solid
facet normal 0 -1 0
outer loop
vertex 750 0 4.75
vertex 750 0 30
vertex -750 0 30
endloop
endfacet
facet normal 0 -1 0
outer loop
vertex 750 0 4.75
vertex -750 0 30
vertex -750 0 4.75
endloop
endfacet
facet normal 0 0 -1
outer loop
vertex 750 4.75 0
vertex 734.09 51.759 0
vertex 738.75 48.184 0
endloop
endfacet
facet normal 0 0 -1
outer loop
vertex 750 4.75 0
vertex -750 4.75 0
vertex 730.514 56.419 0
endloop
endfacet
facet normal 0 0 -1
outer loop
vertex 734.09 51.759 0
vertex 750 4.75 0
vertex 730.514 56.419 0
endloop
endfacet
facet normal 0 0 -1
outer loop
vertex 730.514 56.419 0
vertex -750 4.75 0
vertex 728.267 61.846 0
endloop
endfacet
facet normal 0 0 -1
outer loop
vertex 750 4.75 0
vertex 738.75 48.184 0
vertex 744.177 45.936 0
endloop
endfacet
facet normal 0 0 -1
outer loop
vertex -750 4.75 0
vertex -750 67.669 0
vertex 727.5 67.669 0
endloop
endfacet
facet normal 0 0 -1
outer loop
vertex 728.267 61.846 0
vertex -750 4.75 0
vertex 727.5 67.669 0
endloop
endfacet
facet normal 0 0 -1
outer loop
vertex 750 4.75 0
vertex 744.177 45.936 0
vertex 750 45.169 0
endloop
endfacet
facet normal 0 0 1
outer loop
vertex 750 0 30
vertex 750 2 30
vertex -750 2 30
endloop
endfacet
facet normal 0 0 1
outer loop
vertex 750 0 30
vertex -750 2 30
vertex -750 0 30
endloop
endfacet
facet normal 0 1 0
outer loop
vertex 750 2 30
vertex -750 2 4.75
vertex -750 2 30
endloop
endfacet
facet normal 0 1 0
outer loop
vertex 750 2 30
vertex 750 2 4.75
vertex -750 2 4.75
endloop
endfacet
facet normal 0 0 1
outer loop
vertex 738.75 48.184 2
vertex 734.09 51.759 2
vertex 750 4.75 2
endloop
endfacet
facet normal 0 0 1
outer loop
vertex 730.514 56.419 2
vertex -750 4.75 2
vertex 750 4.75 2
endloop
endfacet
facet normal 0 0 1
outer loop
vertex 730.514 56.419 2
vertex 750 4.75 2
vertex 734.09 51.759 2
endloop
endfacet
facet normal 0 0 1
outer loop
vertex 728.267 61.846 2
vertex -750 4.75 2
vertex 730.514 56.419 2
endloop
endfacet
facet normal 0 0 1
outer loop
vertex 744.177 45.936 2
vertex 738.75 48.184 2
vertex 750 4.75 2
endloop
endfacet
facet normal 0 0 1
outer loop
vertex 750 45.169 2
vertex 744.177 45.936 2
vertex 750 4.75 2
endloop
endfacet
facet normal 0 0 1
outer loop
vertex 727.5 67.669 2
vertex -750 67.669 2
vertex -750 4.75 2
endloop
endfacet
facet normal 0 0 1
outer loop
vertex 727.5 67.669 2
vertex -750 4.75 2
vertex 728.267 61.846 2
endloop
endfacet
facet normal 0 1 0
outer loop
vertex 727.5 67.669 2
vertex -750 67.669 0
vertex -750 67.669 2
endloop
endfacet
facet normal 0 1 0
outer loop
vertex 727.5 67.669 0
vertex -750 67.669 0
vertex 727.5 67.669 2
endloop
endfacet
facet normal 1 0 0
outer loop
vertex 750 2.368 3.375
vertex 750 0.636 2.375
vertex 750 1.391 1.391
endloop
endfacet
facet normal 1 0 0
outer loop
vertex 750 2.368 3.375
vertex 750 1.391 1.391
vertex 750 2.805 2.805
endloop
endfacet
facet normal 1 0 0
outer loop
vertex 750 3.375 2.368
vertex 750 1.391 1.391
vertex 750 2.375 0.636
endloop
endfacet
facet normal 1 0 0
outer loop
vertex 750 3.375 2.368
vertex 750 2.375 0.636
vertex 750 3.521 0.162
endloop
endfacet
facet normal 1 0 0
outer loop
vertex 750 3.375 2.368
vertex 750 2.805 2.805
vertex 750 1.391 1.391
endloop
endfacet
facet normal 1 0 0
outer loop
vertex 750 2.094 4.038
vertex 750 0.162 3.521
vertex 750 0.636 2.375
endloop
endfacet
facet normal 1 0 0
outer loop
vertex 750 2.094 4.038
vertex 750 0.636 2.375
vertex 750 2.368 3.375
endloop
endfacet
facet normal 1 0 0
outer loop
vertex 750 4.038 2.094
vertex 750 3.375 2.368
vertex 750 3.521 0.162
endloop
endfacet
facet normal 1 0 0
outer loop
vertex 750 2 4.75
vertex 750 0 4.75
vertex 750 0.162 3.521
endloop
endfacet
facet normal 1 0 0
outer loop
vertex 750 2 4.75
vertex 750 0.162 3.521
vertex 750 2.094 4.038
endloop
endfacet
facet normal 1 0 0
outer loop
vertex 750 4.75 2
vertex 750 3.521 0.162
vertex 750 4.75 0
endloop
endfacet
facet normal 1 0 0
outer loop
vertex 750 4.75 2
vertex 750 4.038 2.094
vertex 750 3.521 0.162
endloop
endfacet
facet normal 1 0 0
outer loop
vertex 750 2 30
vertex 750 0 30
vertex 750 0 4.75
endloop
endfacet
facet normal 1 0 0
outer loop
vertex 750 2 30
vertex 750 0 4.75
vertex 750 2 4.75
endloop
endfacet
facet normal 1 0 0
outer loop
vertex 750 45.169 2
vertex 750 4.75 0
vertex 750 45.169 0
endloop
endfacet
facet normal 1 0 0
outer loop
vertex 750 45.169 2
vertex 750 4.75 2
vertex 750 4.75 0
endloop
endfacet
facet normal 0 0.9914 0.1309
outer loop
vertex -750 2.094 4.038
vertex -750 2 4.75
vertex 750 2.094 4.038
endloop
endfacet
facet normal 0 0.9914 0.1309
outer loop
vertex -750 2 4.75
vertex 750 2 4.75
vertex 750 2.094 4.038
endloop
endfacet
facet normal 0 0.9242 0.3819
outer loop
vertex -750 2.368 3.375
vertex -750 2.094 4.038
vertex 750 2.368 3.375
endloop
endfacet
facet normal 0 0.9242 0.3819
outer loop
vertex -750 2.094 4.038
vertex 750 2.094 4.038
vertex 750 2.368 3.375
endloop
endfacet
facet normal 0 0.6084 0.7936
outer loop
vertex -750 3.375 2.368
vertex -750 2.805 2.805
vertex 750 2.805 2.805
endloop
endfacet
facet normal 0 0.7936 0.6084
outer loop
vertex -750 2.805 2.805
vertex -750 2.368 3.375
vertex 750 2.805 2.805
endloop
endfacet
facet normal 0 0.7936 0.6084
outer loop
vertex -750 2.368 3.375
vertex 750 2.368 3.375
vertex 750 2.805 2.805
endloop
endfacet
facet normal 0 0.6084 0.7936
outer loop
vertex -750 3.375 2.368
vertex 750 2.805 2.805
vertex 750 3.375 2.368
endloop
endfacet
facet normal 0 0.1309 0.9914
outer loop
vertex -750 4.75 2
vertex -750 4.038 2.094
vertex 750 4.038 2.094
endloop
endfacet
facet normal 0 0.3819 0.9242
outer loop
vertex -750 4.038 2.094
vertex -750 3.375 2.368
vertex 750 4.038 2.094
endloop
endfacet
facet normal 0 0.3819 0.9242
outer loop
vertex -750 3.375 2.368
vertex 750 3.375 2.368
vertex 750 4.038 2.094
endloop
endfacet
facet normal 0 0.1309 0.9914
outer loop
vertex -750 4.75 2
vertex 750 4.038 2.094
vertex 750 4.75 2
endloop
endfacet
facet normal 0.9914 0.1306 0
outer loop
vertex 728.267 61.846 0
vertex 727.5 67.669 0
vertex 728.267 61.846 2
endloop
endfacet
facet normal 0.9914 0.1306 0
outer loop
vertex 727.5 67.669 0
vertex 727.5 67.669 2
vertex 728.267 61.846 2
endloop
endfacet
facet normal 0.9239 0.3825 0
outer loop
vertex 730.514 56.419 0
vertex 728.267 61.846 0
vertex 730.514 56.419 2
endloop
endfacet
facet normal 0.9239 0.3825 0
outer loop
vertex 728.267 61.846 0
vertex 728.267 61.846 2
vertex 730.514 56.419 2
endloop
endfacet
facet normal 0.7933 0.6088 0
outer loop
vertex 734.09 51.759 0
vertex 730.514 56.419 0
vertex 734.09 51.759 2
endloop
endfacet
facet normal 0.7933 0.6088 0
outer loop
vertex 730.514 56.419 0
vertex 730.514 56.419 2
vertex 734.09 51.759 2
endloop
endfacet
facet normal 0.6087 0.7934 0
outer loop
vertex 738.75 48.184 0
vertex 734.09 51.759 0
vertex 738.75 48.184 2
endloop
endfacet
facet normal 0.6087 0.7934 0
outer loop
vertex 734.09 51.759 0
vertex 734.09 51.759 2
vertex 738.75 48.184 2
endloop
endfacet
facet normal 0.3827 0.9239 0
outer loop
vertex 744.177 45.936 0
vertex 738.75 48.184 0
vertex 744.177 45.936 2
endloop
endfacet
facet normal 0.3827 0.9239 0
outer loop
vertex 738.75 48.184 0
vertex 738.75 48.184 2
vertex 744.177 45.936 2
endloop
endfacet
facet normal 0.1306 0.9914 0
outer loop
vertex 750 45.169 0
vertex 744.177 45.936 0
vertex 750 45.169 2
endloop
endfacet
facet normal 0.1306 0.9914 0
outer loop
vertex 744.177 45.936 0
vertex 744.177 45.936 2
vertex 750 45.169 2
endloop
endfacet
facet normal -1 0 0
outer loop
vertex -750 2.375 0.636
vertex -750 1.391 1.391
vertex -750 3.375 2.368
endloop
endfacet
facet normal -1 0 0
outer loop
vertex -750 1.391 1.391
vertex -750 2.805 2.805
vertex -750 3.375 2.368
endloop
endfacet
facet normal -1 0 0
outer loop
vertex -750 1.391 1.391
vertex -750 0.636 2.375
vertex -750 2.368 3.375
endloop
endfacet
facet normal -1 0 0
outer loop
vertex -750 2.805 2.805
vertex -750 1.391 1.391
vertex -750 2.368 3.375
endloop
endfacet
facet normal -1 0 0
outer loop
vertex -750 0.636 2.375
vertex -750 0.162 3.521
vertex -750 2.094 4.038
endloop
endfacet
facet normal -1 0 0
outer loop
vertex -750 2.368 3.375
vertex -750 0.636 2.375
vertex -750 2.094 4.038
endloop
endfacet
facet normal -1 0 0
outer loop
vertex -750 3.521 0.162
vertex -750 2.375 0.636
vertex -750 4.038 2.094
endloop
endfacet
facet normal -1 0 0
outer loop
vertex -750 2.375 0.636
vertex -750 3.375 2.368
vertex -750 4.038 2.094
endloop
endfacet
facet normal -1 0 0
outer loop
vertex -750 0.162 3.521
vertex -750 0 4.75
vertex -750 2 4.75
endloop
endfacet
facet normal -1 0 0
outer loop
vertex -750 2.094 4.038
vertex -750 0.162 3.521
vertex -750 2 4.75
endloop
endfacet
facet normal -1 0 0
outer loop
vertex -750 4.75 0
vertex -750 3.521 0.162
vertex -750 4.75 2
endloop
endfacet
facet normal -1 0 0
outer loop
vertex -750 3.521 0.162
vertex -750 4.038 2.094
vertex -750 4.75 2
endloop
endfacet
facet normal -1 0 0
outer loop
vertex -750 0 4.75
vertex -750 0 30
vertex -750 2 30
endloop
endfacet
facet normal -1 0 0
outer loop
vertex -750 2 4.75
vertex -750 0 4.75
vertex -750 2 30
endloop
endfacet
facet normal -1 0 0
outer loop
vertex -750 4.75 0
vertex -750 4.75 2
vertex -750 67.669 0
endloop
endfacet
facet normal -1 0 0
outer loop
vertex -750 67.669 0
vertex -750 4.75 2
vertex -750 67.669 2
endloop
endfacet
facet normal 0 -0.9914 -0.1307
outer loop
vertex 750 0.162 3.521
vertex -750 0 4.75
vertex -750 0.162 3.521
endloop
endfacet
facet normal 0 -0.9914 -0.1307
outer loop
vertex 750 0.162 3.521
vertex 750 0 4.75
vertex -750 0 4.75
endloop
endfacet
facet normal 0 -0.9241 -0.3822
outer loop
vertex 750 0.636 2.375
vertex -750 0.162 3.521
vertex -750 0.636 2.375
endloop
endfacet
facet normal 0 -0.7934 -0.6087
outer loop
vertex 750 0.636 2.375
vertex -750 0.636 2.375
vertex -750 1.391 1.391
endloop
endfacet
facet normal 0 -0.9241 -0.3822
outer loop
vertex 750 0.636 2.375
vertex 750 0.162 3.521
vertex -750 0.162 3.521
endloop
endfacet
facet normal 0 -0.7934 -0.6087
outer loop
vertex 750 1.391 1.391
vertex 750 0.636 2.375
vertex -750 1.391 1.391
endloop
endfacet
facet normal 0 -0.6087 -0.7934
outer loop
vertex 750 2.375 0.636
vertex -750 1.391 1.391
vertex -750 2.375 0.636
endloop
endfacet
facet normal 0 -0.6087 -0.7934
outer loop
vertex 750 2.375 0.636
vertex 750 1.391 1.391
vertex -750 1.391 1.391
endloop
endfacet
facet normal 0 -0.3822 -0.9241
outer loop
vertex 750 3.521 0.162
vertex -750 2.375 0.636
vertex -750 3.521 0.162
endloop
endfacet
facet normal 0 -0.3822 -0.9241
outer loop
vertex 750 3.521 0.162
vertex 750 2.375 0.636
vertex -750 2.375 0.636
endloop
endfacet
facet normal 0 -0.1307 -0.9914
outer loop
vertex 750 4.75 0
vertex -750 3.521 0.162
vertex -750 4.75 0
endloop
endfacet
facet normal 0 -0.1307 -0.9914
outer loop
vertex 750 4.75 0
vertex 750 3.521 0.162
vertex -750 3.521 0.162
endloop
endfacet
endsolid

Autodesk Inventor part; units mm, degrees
ref_plane "YZ Plane" through (0, 0, 0) normal (1, 0, 0) x (0, 1, 0)
ref_plane "XZ Plane" through (0, 0, 0) normal (0, 1, 0) x (-1, 0, 0)
ref_plane "XY Plane" through (0, 0, 0) normal (0, 0, 1) x (1, 0, 0)
sketch "Sketch1" plane through (0, 0, 0) normal (0, 0, 1) x (1, 0, 0)
  line L0 (-750, 67.6691) -> (750, 67.6691)
  line L1 (750, 67.6691) -> (750, 0)
  line L2 (750, 0) -> (-750, 0)
  line L3 (-750, 0) -> (-750, 67.6691)
  point P0 (0, 0)
  point P1 (0, 0)
  dimension "d0" = 1500
  dimension "d1" = 67.669
extrude "Plate1" add sketch "Sketch1" along normal blind 2
sketch "Sketch2" plane through (750, 2, 0) normal (0, -1, 0) x (1, 0, 0)
  line L0 (-1500, 0) -> (0, 0)
  line L1 (0, 0) -> (0, 30)
  line L2 (0, 30) -> (-1500, 30)
  line L3 (-1500, 30) -> (-1500, 0)
edge flange "Flange1" height 30 angle 90 thickness 2 bend radius 2.75 thickness toward (0, -1, 0) relief round relief width 2 relief depth 1 edges at (0, 0, 2) wall of the first edge with corners at (-750, 2, 0) (750, 2, 0) (750, 2, 30) (-750, 2, 30)
bend "Bend1"
corner "Corner1"
sketch "Sketch6" plane through (0, 0, 0) normal (0, 0, -1) x (-1, 0, 0)
  line L0 (-750, 67.6691) -> (-750, 4.75) projected
  circle A0 centre (-750, 67.6691) radius 22.5
  line L1 (-750, 67.6691) -> (750, 67.6691) projected
  line L2 (-1, 67.6691) -> (-1, 30) projected
  line L3 (-499, 30) -> (-499, 67.6691) projected
  line L4 (-1, 30) -> (-499, 30) construction
  circle A1 centre (-250, 67.6691) radius 22.5
  point P0 (0, 0)
  point P1 (-727.5, 67.6691)
  point P2 (-750, 45.1691)
  point P3 (-250, 30)
  dimension "d24" = 45
extrude "Extrusion2" cut sketch "Sketch6" along normal mid plane 30 contours L1 A0 L0 picked at (-748.3311, 52.8571)
sketch "Sketch7" plane through (0, 0, 2) normal (0, 0, 1) x (1, 0, 0)
  line L0 (-750, 4.75) -> (-750, 67.6691) projected
  line L1 (-750, 4.75) -> (750, 4.75) projected
  line L2 (750, 45.1691) -> (750, 4.75) projected
  arc A0 (727.5, 67.6691) -> (750, 45.1691) centre (750, 67.6691) ccw projected
  line L3 (-750, 67.6691) -> (727.5, 67.6691) projected
  line L4 (649, 32.2095) -> (651, 32.2095)
  line L5 (651, 32.2095) -> (651, 40.2095)
  line L6 (651, 40.2095) -> (649, 40.2095)
  line L7 (649, 40.2095) -> (649, 32.2095)
  line L8 (-750, 4.75) -> (750, 4.75) projected
  line L9 (650, 4.75) -> (650, 67.6691) construction
  line L10 (637, 32.2095) -> (639, 32.2095)
  line L11 (639, 32.2095) -> (639, 40.2095)
  line L12 (639, 40.2095) -> (637, 40.2095)
  line L13 (637, 40.2095) -> (637, 32.2095)
  point P0 (0, 0)
  point P1 (650, 32.2095)
  point P2 (649, 36.2095)
  point P3 (650, 36.2095)
  point P4 (639, 36.2095)
  dimension "d30" = 2
  dimension "d31" = 8
  dimension "d32" = 100
  dimension "d33" = 2
  dimension "d34" = 8
  dimension "d35" = 10
extrude "Extrusion3" [suppressed]
mirror "Mirror2" [suppressed]
sketch "Sketch9" plane through (0, 0, 2) normal (0, 0, 1) x (1, 0, 0)
  line L0 (494, 62.6691) -> (494, 50.6691) construction
  line L1 (494, 50.6691) -> (294, 50.6691) construction
  line L2 (294, 50.6691) -> (294, 62.6691) construction
  line L3 (294, 62.6691) -> (494, 62.6691) construction
  line L4 (499, 30) -> (499, 67.6691) projected
  line L5 (-750, 67.6691) -> (750, 67.6691) projected
  point P0 (0, 0)
  point P1 (1, 67.6691)
  dimension "d40" = 200
  dimension "d41" = 12
  dimension "d42" = 5
  dimension "d43" = 5
mark "Mark2"
equation "\"d1\" = Стрингер_2"
equation "\"d43\" = d42"
equation "\"d2\" = Thickness"
equation "\"d3\" = BendReliefWidth"
equation "\"d4\" = BendReliefDepth"
equation "\"d5\" = MinimumRemnant"
equation "\"d6\" = TransitionRadius"
equation "\"d9\" = BendRadius"
equation "\"d10\" = CornerReliefSize"
equation "\"d11\" = GapSize"
equation "\"d12\" = JacobiRadiusSize"
equation "\"BendReliefWidth\" = Thickness"
equation "\"BendReliefDepth\" = 0.5 * Thickness"
equation "\"CornerReliefSize\" = 4 * Thickness"
equation "\"MinimumRemnant\" = 2 * Thickness"
equation "\"TransitionRadius\" = BendRadius"
equation "\"JacobiRadiusSize\" = BendRadius"
equation "\"GapSize\" = Thickness"
equation "\"qqqqqq\" = 67.35706"
equation "\"Стрингер_2\" = 67.669053"
equation "\"Thickness\" = 2"
equation "\"BendRadius\" = 2.75"
properties part number "МОО 068 stringer lowerback" material "Stainless Steel"
